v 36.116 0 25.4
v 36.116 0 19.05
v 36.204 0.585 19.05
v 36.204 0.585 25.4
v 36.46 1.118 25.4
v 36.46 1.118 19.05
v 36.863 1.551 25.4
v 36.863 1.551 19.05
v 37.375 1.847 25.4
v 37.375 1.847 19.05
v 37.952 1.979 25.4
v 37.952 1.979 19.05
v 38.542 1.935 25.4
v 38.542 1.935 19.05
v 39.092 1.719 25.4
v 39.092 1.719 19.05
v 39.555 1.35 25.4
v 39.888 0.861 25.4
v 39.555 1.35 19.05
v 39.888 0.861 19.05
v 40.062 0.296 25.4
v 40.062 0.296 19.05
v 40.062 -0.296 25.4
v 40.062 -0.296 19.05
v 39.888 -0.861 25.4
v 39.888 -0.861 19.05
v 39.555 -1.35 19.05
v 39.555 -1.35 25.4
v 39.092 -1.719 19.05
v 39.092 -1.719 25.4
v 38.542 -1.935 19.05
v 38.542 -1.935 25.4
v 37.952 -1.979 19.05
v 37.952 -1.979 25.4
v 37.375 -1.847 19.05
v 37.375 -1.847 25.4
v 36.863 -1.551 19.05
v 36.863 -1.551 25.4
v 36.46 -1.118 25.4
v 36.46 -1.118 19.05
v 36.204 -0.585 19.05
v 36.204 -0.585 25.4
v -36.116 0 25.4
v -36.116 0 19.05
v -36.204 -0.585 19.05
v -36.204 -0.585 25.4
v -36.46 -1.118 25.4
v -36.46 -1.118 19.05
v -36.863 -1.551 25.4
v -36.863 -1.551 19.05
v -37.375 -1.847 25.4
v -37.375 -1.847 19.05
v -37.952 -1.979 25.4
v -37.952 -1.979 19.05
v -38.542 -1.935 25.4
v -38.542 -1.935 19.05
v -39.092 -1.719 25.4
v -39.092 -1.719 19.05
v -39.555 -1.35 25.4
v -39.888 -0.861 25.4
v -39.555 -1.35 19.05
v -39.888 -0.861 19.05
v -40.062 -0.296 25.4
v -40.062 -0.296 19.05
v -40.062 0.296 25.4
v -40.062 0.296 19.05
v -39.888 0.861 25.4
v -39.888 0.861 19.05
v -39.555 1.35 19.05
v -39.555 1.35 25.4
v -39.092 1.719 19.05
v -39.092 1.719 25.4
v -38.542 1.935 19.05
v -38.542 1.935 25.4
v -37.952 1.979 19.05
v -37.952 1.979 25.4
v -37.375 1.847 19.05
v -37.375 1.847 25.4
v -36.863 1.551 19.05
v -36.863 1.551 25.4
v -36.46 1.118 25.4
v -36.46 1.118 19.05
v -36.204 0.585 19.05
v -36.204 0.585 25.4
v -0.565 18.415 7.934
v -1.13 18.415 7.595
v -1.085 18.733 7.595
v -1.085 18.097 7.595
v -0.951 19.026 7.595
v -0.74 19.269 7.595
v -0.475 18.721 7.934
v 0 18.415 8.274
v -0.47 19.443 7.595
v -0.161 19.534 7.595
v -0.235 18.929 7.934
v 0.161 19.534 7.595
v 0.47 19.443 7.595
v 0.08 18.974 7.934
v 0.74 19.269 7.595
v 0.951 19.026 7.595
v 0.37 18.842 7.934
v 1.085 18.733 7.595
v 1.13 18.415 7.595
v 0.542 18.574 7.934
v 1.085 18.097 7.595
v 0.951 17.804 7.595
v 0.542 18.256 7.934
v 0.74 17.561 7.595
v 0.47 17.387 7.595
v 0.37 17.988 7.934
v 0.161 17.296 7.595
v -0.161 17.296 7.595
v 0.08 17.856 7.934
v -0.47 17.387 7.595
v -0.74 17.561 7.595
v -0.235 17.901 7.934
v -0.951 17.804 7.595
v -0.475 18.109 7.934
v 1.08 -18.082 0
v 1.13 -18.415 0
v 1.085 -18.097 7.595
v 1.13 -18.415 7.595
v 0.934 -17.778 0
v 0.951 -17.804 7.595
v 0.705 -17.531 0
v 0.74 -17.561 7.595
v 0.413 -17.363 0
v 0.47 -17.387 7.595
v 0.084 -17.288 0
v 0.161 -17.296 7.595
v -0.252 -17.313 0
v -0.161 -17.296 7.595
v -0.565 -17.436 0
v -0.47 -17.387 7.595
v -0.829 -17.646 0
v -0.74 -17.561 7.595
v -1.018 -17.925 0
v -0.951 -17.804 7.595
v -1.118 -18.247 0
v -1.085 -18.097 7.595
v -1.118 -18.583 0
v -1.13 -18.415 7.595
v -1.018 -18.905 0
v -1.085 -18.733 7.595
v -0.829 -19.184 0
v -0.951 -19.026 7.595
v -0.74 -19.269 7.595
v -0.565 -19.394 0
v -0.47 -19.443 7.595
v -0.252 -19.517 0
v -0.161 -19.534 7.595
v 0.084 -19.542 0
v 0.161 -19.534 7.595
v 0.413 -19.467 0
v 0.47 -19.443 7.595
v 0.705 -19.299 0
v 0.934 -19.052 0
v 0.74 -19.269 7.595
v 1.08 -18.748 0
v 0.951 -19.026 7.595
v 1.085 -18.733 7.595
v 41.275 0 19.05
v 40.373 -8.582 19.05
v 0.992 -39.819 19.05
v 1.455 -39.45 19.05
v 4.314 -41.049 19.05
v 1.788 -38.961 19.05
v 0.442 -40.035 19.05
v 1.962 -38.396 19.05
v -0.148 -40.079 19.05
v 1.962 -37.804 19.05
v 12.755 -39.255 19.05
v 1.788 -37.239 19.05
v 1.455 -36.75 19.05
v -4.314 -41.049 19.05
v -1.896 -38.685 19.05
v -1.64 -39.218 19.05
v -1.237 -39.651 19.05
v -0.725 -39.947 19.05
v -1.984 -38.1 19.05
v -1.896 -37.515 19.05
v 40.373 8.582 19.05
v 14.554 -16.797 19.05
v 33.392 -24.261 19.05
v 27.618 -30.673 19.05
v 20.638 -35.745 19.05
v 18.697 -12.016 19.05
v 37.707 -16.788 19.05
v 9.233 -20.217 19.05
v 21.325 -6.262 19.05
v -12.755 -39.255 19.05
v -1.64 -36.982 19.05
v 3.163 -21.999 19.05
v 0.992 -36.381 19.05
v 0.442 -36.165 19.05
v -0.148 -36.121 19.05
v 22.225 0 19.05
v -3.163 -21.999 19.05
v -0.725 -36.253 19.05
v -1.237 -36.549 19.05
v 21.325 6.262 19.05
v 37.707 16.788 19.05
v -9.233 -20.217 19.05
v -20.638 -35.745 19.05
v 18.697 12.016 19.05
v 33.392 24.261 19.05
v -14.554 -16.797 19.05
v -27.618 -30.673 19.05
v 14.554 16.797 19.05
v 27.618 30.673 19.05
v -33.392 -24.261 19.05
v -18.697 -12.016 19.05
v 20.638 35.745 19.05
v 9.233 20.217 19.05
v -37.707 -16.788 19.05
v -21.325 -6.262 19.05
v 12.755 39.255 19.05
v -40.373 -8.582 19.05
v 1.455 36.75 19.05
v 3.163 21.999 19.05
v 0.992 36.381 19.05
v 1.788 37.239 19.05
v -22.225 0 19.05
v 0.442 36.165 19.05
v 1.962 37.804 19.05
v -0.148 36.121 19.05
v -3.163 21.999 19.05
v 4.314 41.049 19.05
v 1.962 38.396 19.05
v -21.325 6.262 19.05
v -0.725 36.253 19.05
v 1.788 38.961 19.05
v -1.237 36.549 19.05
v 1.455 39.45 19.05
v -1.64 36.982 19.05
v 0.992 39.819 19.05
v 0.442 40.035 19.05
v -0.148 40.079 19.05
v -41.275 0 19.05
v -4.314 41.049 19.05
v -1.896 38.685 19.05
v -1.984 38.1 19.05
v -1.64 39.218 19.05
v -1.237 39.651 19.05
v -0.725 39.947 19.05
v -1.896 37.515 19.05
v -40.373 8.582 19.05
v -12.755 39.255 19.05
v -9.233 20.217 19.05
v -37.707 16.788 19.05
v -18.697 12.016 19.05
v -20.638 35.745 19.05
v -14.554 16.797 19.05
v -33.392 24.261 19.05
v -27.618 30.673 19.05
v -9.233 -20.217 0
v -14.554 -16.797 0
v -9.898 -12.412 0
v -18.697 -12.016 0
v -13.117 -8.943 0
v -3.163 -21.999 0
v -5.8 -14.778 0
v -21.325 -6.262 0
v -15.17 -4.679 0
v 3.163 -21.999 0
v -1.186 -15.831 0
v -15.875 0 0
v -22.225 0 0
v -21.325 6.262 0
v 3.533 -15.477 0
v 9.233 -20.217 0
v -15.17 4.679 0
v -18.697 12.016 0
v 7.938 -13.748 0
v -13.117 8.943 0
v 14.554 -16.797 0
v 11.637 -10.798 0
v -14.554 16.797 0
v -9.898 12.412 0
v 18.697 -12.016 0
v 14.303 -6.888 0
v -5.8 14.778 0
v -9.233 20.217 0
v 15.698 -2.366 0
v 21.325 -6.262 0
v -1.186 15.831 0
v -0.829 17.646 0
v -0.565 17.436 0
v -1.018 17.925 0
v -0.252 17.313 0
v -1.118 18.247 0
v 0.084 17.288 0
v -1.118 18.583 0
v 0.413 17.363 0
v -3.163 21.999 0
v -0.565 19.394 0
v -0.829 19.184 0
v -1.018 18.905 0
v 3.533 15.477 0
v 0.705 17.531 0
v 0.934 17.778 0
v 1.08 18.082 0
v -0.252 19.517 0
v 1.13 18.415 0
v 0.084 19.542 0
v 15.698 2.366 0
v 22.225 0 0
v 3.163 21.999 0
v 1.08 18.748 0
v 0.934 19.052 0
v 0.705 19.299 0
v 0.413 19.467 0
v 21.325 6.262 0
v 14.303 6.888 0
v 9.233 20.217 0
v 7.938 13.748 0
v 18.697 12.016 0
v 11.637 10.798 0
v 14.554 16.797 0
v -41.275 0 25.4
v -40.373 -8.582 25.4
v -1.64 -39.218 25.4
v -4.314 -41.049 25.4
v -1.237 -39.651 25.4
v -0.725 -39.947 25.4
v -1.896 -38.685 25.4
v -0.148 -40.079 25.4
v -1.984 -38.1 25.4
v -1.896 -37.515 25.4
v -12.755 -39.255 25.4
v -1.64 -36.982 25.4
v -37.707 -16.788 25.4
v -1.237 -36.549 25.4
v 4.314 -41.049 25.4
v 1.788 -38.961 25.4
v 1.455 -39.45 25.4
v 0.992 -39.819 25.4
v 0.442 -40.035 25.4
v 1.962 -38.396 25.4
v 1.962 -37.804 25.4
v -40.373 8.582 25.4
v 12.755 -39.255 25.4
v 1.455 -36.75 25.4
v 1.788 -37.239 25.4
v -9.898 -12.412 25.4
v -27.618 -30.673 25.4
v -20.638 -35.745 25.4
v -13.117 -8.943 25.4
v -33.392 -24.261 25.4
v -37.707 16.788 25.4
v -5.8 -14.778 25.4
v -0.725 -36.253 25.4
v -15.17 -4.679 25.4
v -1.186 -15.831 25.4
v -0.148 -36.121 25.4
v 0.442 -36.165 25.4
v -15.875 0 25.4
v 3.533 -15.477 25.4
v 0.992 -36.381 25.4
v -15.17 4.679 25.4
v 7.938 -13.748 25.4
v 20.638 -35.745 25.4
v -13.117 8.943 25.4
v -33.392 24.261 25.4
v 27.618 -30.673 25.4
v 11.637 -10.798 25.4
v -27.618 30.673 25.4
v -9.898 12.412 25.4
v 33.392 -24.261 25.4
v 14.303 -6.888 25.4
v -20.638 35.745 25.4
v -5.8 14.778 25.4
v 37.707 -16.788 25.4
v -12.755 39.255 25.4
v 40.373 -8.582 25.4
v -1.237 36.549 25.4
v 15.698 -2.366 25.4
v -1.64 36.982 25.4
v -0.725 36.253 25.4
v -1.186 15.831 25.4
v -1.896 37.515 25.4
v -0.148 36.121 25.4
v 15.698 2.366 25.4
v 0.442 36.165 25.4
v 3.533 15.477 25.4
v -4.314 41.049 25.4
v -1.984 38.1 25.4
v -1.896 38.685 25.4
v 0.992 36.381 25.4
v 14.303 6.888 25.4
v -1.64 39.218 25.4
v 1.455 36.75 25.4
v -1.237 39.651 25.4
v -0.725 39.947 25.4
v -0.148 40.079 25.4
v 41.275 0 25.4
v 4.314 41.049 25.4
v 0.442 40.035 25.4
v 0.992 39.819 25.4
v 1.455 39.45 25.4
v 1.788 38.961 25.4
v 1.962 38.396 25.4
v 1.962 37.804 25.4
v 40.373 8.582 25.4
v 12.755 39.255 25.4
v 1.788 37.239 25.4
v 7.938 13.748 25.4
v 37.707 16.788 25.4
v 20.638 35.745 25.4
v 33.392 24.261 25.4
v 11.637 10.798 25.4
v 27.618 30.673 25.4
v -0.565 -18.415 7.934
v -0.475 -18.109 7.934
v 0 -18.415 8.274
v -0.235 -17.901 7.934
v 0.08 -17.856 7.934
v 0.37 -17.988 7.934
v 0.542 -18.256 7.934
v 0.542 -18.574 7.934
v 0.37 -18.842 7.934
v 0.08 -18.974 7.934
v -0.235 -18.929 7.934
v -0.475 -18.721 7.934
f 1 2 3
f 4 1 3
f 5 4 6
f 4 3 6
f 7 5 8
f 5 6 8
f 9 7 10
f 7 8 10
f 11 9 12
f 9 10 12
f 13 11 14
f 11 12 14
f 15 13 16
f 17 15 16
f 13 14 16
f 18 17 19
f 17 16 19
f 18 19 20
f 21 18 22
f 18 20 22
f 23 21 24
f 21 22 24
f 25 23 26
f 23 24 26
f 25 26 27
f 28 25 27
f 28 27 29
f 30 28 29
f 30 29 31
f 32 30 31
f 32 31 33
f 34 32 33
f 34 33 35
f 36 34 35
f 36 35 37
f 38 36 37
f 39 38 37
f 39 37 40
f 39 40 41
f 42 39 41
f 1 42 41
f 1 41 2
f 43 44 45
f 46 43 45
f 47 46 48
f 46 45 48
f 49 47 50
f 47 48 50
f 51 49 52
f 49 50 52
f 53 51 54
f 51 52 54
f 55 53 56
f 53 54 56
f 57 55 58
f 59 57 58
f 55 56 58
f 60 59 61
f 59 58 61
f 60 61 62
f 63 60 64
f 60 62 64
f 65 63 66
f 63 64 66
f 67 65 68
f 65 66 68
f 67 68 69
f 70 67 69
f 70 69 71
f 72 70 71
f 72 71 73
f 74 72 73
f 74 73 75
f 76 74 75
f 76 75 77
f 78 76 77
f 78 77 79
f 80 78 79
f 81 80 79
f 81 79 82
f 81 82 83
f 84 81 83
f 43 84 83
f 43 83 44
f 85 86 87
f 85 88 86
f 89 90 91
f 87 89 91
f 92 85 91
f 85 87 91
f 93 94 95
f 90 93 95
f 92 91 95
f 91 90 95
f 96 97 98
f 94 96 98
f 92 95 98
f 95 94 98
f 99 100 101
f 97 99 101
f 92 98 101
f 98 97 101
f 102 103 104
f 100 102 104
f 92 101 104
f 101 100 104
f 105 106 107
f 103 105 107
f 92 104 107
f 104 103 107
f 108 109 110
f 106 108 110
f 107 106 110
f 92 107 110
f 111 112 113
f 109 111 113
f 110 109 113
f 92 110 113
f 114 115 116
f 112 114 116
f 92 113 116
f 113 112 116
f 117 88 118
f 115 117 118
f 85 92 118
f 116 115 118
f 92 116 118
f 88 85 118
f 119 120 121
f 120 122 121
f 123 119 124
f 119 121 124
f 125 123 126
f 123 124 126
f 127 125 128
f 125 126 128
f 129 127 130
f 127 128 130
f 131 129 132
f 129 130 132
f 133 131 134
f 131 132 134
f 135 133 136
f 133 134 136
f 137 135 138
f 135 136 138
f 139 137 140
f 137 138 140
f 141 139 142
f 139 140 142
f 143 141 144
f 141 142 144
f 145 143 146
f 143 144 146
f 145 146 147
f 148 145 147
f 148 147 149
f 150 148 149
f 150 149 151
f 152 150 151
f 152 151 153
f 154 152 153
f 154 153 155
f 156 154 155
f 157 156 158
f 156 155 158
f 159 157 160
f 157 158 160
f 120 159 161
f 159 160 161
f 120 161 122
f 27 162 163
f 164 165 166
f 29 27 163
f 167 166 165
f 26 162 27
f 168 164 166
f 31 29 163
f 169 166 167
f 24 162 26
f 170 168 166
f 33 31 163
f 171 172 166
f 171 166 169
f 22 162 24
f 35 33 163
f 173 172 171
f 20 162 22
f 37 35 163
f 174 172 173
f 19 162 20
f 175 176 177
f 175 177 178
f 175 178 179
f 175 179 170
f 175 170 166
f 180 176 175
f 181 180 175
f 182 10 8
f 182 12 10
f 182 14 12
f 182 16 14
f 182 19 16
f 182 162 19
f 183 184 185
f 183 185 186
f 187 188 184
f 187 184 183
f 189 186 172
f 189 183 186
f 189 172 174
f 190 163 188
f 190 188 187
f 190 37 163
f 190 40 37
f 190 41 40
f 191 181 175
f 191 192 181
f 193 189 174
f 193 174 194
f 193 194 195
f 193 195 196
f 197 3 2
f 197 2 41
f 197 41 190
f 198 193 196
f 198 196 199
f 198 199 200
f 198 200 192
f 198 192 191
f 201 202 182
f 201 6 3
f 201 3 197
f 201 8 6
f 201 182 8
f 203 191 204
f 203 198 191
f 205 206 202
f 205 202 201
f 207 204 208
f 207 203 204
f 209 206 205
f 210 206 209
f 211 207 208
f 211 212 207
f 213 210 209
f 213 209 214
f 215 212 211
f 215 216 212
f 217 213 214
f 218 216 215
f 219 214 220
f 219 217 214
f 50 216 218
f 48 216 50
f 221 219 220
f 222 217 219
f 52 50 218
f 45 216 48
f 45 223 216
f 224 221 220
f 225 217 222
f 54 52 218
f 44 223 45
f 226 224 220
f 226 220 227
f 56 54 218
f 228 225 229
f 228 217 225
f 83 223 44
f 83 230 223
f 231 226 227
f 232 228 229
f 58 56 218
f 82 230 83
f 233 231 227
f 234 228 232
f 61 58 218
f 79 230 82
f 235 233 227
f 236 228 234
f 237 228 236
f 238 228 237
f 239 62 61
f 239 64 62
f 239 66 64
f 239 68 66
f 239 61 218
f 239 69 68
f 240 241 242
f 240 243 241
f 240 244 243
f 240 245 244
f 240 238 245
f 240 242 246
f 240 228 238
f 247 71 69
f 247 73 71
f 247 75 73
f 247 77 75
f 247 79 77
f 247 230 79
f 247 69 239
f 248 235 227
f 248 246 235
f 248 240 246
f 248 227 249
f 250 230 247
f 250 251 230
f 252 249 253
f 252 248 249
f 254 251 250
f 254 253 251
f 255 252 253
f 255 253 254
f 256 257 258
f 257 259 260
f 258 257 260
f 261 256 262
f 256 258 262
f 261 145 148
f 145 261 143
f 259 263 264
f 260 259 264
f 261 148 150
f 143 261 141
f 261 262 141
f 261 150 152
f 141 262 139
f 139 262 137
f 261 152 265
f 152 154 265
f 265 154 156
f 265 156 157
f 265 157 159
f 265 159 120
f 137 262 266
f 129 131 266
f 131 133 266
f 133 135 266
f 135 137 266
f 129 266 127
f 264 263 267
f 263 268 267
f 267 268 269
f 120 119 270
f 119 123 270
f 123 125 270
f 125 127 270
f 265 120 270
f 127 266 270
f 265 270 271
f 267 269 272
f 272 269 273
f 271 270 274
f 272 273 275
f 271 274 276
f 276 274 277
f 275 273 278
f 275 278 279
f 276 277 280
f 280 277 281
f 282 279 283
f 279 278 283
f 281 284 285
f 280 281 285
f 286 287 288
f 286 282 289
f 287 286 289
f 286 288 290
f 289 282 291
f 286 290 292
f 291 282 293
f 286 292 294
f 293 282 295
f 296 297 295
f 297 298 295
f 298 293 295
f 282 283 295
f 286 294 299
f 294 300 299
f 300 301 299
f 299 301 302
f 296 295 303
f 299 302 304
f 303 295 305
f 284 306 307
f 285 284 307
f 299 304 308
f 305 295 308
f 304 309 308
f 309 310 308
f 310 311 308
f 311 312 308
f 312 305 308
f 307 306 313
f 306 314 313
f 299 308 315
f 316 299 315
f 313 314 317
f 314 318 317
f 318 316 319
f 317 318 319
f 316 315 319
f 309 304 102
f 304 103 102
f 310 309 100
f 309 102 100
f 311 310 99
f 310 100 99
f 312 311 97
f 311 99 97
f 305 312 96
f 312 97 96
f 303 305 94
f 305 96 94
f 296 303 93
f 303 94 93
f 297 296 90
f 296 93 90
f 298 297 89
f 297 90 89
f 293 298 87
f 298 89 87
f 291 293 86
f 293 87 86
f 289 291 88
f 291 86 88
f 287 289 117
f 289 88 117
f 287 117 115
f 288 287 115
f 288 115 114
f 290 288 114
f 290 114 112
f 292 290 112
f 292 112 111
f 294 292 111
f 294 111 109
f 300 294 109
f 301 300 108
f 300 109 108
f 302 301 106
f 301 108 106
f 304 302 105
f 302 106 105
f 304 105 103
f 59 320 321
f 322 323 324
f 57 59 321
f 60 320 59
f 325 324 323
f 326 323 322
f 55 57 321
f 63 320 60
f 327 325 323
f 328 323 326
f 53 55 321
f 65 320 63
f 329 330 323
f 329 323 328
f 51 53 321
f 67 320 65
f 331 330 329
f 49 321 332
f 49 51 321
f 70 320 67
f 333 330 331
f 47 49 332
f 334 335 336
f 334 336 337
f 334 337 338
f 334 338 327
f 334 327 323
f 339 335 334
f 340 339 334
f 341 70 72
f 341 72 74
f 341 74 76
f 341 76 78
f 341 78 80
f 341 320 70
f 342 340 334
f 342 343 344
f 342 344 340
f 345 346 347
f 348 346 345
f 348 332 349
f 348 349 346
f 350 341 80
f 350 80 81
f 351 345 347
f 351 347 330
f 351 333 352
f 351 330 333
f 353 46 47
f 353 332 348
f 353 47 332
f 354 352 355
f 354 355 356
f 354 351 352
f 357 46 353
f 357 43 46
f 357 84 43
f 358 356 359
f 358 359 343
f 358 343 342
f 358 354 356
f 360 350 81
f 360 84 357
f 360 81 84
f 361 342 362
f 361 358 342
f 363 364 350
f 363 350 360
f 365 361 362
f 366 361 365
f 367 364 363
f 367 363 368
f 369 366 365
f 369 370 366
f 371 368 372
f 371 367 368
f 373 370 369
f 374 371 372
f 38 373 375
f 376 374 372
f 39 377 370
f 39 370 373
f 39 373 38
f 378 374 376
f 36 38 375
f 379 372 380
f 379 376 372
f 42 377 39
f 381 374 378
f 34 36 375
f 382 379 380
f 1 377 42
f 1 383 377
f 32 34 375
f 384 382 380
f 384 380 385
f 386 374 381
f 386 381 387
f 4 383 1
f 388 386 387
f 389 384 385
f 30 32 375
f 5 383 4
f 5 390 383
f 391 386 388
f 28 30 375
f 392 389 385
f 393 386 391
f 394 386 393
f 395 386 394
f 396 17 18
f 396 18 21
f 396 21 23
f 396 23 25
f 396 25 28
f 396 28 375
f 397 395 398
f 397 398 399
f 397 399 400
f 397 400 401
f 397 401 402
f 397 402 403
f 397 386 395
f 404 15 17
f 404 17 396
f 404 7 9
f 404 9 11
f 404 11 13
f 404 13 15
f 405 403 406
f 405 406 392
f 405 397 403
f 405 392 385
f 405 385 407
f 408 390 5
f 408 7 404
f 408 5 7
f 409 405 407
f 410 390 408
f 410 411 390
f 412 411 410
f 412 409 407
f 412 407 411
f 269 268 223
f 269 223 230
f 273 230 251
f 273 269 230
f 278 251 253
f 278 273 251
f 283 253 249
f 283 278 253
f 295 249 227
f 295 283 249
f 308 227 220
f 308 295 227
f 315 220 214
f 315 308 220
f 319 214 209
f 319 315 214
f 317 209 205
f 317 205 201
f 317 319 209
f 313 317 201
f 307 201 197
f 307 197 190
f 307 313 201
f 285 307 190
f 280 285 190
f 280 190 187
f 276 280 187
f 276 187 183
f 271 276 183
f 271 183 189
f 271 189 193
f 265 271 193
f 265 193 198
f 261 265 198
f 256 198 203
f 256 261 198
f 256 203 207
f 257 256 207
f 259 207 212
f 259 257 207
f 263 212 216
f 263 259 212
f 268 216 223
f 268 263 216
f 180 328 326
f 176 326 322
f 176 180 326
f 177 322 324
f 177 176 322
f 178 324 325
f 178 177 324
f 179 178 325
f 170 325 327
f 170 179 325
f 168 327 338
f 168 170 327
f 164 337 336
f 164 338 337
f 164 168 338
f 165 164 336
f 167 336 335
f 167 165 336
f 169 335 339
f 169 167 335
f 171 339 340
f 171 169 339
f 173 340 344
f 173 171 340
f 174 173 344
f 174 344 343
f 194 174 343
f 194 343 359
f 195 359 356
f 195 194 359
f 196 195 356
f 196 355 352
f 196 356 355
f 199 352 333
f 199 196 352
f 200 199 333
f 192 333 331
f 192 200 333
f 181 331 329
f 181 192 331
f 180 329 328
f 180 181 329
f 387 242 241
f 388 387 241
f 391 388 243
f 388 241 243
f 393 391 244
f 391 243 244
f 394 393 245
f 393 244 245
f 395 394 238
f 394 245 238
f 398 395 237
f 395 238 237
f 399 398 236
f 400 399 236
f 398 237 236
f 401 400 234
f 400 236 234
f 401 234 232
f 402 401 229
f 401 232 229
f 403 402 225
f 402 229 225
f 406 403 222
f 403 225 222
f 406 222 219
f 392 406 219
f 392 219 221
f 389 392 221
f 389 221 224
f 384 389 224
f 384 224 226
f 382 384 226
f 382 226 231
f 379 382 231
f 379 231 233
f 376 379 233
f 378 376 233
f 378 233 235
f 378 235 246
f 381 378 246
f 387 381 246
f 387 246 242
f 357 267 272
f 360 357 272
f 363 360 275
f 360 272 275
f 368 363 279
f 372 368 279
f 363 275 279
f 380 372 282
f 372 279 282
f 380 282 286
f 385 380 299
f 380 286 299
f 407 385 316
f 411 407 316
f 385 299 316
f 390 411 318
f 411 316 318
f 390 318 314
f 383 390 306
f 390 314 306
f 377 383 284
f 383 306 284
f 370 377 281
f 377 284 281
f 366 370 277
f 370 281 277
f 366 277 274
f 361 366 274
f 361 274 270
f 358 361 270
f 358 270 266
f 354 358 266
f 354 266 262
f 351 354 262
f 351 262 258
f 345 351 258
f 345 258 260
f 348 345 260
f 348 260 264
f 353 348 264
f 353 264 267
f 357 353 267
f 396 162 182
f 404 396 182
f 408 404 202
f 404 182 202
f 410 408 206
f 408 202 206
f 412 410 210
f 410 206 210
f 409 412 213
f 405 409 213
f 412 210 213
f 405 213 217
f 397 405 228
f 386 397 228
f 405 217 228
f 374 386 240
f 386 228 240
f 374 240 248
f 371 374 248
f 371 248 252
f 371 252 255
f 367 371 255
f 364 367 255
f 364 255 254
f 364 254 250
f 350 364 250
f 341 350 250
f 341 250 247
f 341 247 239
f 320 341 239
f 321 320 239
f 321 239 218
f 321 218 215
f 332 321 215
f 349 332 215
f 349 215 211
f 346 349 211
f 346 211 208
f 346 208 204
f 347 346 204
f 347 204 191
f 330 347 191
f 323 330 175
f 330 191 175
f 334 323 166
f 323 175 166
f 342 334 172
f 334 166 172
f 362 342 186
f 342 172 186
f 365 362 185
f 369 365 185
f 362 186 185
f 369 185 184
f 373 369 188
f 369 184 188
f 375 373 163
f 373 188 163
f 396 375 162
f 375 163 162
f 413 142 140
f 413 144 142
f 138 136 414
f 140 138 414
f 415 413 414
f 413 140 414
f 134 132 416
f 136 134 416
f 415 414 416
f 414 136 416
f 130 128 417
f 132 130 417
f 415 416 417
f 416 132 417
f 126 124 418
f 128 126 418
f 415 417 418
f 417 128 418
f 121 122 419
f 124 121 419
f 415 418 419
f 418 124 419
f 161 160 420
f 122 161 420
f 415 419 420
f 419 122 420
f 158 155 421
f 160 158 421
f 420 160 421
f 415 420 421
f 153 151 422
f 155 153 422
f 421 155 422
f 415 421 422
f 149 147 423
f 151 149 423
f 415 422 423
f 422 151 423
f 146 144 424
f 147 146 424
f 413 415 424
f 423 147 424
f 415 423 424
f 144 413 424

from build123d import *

# Parameters (mm, degrees)
SKETCH1_R                       = 41.275
BOSS_EXTRUDE1_DEPTH             = 25.4
SKETCH2_OUTSIDE_W               = 108.444
SKETCH2_OUTSIDE_H               = 108.444
SKETCH2_OUTSIDE_R               = 22.225
CUT_EXTRUDE1_DEPTH              = 19.05
SKETCH3_R                       = 15.875
CUT_EXTRUDE2_DEPTH              = 26.4
F_4_40_TAPPED_HOLE1_D           = 2.2606
F_4_40_TAPPED_HOLE1_DEPTH       = 7.5946
F_4_40_TAPPED_HOLE1_TIP         = 0.679152758
F_5_32_0_15625_DIAMETER_HOLE1_D = 3.96875
MIRROR2_COPY_1_D                = 3.96875
MIRROR2_COPY_2_D                = 3.96875


with BuildPart() as part:
    # Sketch1 → Boss-Extrude1 (new body)
    with BuildSketch(Plane.XY):
        Circle(SKETCH1_R)
    extrude(amount=BOSS_EXTRUDE1_DEPTH)

    # Sketch2 outside → Cut-Extrude1 (cut)
    with BuildSketch(Plane(origin=(0, 0, 0), x_dir=(-1, 0, 0), z_dir=(0, 0, -1))):
        Rectangle(SKETCH2_OUTSIDE_W, SKETCH2_OUTSIDE_H)
        Circle(SKETCH2_OUTSIDE_R, mode=Mode.SUBTRACT)
    extrude(amount=-CUT_EXTRUDE1_DEPTH, mode=Mode.SUBTRACT)

    # Sketch3 → Cut-Extrude2 (cut, through all)
    with BuildSketch(Plane(origin=(0, 0, 0), x_dir=(-1, 0, 0), z_dir=(0, 0, -1))):
        Circle(SKETCH3_R)
    extrude(amount=-CUT_EXTRUDE2_DEPTH, mode=Mode.SUBTRACT)

    # #4-40 Tapped Hole1
    with Locations(Plane(origin=(0, 0, 0), x_dir=(-1, 0, 0), z_dir=(0, 0, -1))):
        with Locations((0, 18.415), (0, -18.415)):
            Hole(F_4_40_TAPPED_HOLE1_D / 2, depth=F_4_40_TAPPED_HOLE1_DEPTH)
            with Locations((0, 0, -(F_4_40_TAPPED_HOLE1_DEPTH + F_4_40_TAPPED_HOLE1_TIP / 2))):  # 118° drill point
                Cone(0, F_4_40_TAPPED_HOLE1_D / 2, F_4_40_TAPPED_HOLE1_TIP, mode=Mode.SUBTRACT)

    # 5/32 (0.15625) Diameter Hole1 (through all)
    with Locations(Plane.XY.offset(25.4)):
        with Locations((0, 38.1), (38.1, 0)):
            f_5_32_0_15625_diameter_hole1 = Hole(F_5_32_0_15625_DIAMETER_HOLE1_D / 2)

    # Mirror1: 5/32 (0.15625) Diameter Hole1 across plane
    add(f_5_32_0_15625_diameter_hole1.mirror(Plane.ZX), mode=Mode.SUBTRACT)

    # Mirror2 copy 1 (through all)
    with Locations(Plane(origin=(0, 0, 25.4), x_dir=(-1, 0, 0), z_dir=(0, 0, 1))):
        with Locations((0, 38.1), (38.1, 0)):
            Hole(MIRROR2_COPY_1_D / 2)

    # Mirror2 copy 2 (through all)
    with Locations(Plane(origin=(0, 0, 25.4), x_dir=(-1, 0, 0), z_dir=(0, 0, 1))):
        with Locations((0, -38.1), (38.1, 0)):
            Hole(MIRROR2_COPY_2_D / 2)


solid = part.part
